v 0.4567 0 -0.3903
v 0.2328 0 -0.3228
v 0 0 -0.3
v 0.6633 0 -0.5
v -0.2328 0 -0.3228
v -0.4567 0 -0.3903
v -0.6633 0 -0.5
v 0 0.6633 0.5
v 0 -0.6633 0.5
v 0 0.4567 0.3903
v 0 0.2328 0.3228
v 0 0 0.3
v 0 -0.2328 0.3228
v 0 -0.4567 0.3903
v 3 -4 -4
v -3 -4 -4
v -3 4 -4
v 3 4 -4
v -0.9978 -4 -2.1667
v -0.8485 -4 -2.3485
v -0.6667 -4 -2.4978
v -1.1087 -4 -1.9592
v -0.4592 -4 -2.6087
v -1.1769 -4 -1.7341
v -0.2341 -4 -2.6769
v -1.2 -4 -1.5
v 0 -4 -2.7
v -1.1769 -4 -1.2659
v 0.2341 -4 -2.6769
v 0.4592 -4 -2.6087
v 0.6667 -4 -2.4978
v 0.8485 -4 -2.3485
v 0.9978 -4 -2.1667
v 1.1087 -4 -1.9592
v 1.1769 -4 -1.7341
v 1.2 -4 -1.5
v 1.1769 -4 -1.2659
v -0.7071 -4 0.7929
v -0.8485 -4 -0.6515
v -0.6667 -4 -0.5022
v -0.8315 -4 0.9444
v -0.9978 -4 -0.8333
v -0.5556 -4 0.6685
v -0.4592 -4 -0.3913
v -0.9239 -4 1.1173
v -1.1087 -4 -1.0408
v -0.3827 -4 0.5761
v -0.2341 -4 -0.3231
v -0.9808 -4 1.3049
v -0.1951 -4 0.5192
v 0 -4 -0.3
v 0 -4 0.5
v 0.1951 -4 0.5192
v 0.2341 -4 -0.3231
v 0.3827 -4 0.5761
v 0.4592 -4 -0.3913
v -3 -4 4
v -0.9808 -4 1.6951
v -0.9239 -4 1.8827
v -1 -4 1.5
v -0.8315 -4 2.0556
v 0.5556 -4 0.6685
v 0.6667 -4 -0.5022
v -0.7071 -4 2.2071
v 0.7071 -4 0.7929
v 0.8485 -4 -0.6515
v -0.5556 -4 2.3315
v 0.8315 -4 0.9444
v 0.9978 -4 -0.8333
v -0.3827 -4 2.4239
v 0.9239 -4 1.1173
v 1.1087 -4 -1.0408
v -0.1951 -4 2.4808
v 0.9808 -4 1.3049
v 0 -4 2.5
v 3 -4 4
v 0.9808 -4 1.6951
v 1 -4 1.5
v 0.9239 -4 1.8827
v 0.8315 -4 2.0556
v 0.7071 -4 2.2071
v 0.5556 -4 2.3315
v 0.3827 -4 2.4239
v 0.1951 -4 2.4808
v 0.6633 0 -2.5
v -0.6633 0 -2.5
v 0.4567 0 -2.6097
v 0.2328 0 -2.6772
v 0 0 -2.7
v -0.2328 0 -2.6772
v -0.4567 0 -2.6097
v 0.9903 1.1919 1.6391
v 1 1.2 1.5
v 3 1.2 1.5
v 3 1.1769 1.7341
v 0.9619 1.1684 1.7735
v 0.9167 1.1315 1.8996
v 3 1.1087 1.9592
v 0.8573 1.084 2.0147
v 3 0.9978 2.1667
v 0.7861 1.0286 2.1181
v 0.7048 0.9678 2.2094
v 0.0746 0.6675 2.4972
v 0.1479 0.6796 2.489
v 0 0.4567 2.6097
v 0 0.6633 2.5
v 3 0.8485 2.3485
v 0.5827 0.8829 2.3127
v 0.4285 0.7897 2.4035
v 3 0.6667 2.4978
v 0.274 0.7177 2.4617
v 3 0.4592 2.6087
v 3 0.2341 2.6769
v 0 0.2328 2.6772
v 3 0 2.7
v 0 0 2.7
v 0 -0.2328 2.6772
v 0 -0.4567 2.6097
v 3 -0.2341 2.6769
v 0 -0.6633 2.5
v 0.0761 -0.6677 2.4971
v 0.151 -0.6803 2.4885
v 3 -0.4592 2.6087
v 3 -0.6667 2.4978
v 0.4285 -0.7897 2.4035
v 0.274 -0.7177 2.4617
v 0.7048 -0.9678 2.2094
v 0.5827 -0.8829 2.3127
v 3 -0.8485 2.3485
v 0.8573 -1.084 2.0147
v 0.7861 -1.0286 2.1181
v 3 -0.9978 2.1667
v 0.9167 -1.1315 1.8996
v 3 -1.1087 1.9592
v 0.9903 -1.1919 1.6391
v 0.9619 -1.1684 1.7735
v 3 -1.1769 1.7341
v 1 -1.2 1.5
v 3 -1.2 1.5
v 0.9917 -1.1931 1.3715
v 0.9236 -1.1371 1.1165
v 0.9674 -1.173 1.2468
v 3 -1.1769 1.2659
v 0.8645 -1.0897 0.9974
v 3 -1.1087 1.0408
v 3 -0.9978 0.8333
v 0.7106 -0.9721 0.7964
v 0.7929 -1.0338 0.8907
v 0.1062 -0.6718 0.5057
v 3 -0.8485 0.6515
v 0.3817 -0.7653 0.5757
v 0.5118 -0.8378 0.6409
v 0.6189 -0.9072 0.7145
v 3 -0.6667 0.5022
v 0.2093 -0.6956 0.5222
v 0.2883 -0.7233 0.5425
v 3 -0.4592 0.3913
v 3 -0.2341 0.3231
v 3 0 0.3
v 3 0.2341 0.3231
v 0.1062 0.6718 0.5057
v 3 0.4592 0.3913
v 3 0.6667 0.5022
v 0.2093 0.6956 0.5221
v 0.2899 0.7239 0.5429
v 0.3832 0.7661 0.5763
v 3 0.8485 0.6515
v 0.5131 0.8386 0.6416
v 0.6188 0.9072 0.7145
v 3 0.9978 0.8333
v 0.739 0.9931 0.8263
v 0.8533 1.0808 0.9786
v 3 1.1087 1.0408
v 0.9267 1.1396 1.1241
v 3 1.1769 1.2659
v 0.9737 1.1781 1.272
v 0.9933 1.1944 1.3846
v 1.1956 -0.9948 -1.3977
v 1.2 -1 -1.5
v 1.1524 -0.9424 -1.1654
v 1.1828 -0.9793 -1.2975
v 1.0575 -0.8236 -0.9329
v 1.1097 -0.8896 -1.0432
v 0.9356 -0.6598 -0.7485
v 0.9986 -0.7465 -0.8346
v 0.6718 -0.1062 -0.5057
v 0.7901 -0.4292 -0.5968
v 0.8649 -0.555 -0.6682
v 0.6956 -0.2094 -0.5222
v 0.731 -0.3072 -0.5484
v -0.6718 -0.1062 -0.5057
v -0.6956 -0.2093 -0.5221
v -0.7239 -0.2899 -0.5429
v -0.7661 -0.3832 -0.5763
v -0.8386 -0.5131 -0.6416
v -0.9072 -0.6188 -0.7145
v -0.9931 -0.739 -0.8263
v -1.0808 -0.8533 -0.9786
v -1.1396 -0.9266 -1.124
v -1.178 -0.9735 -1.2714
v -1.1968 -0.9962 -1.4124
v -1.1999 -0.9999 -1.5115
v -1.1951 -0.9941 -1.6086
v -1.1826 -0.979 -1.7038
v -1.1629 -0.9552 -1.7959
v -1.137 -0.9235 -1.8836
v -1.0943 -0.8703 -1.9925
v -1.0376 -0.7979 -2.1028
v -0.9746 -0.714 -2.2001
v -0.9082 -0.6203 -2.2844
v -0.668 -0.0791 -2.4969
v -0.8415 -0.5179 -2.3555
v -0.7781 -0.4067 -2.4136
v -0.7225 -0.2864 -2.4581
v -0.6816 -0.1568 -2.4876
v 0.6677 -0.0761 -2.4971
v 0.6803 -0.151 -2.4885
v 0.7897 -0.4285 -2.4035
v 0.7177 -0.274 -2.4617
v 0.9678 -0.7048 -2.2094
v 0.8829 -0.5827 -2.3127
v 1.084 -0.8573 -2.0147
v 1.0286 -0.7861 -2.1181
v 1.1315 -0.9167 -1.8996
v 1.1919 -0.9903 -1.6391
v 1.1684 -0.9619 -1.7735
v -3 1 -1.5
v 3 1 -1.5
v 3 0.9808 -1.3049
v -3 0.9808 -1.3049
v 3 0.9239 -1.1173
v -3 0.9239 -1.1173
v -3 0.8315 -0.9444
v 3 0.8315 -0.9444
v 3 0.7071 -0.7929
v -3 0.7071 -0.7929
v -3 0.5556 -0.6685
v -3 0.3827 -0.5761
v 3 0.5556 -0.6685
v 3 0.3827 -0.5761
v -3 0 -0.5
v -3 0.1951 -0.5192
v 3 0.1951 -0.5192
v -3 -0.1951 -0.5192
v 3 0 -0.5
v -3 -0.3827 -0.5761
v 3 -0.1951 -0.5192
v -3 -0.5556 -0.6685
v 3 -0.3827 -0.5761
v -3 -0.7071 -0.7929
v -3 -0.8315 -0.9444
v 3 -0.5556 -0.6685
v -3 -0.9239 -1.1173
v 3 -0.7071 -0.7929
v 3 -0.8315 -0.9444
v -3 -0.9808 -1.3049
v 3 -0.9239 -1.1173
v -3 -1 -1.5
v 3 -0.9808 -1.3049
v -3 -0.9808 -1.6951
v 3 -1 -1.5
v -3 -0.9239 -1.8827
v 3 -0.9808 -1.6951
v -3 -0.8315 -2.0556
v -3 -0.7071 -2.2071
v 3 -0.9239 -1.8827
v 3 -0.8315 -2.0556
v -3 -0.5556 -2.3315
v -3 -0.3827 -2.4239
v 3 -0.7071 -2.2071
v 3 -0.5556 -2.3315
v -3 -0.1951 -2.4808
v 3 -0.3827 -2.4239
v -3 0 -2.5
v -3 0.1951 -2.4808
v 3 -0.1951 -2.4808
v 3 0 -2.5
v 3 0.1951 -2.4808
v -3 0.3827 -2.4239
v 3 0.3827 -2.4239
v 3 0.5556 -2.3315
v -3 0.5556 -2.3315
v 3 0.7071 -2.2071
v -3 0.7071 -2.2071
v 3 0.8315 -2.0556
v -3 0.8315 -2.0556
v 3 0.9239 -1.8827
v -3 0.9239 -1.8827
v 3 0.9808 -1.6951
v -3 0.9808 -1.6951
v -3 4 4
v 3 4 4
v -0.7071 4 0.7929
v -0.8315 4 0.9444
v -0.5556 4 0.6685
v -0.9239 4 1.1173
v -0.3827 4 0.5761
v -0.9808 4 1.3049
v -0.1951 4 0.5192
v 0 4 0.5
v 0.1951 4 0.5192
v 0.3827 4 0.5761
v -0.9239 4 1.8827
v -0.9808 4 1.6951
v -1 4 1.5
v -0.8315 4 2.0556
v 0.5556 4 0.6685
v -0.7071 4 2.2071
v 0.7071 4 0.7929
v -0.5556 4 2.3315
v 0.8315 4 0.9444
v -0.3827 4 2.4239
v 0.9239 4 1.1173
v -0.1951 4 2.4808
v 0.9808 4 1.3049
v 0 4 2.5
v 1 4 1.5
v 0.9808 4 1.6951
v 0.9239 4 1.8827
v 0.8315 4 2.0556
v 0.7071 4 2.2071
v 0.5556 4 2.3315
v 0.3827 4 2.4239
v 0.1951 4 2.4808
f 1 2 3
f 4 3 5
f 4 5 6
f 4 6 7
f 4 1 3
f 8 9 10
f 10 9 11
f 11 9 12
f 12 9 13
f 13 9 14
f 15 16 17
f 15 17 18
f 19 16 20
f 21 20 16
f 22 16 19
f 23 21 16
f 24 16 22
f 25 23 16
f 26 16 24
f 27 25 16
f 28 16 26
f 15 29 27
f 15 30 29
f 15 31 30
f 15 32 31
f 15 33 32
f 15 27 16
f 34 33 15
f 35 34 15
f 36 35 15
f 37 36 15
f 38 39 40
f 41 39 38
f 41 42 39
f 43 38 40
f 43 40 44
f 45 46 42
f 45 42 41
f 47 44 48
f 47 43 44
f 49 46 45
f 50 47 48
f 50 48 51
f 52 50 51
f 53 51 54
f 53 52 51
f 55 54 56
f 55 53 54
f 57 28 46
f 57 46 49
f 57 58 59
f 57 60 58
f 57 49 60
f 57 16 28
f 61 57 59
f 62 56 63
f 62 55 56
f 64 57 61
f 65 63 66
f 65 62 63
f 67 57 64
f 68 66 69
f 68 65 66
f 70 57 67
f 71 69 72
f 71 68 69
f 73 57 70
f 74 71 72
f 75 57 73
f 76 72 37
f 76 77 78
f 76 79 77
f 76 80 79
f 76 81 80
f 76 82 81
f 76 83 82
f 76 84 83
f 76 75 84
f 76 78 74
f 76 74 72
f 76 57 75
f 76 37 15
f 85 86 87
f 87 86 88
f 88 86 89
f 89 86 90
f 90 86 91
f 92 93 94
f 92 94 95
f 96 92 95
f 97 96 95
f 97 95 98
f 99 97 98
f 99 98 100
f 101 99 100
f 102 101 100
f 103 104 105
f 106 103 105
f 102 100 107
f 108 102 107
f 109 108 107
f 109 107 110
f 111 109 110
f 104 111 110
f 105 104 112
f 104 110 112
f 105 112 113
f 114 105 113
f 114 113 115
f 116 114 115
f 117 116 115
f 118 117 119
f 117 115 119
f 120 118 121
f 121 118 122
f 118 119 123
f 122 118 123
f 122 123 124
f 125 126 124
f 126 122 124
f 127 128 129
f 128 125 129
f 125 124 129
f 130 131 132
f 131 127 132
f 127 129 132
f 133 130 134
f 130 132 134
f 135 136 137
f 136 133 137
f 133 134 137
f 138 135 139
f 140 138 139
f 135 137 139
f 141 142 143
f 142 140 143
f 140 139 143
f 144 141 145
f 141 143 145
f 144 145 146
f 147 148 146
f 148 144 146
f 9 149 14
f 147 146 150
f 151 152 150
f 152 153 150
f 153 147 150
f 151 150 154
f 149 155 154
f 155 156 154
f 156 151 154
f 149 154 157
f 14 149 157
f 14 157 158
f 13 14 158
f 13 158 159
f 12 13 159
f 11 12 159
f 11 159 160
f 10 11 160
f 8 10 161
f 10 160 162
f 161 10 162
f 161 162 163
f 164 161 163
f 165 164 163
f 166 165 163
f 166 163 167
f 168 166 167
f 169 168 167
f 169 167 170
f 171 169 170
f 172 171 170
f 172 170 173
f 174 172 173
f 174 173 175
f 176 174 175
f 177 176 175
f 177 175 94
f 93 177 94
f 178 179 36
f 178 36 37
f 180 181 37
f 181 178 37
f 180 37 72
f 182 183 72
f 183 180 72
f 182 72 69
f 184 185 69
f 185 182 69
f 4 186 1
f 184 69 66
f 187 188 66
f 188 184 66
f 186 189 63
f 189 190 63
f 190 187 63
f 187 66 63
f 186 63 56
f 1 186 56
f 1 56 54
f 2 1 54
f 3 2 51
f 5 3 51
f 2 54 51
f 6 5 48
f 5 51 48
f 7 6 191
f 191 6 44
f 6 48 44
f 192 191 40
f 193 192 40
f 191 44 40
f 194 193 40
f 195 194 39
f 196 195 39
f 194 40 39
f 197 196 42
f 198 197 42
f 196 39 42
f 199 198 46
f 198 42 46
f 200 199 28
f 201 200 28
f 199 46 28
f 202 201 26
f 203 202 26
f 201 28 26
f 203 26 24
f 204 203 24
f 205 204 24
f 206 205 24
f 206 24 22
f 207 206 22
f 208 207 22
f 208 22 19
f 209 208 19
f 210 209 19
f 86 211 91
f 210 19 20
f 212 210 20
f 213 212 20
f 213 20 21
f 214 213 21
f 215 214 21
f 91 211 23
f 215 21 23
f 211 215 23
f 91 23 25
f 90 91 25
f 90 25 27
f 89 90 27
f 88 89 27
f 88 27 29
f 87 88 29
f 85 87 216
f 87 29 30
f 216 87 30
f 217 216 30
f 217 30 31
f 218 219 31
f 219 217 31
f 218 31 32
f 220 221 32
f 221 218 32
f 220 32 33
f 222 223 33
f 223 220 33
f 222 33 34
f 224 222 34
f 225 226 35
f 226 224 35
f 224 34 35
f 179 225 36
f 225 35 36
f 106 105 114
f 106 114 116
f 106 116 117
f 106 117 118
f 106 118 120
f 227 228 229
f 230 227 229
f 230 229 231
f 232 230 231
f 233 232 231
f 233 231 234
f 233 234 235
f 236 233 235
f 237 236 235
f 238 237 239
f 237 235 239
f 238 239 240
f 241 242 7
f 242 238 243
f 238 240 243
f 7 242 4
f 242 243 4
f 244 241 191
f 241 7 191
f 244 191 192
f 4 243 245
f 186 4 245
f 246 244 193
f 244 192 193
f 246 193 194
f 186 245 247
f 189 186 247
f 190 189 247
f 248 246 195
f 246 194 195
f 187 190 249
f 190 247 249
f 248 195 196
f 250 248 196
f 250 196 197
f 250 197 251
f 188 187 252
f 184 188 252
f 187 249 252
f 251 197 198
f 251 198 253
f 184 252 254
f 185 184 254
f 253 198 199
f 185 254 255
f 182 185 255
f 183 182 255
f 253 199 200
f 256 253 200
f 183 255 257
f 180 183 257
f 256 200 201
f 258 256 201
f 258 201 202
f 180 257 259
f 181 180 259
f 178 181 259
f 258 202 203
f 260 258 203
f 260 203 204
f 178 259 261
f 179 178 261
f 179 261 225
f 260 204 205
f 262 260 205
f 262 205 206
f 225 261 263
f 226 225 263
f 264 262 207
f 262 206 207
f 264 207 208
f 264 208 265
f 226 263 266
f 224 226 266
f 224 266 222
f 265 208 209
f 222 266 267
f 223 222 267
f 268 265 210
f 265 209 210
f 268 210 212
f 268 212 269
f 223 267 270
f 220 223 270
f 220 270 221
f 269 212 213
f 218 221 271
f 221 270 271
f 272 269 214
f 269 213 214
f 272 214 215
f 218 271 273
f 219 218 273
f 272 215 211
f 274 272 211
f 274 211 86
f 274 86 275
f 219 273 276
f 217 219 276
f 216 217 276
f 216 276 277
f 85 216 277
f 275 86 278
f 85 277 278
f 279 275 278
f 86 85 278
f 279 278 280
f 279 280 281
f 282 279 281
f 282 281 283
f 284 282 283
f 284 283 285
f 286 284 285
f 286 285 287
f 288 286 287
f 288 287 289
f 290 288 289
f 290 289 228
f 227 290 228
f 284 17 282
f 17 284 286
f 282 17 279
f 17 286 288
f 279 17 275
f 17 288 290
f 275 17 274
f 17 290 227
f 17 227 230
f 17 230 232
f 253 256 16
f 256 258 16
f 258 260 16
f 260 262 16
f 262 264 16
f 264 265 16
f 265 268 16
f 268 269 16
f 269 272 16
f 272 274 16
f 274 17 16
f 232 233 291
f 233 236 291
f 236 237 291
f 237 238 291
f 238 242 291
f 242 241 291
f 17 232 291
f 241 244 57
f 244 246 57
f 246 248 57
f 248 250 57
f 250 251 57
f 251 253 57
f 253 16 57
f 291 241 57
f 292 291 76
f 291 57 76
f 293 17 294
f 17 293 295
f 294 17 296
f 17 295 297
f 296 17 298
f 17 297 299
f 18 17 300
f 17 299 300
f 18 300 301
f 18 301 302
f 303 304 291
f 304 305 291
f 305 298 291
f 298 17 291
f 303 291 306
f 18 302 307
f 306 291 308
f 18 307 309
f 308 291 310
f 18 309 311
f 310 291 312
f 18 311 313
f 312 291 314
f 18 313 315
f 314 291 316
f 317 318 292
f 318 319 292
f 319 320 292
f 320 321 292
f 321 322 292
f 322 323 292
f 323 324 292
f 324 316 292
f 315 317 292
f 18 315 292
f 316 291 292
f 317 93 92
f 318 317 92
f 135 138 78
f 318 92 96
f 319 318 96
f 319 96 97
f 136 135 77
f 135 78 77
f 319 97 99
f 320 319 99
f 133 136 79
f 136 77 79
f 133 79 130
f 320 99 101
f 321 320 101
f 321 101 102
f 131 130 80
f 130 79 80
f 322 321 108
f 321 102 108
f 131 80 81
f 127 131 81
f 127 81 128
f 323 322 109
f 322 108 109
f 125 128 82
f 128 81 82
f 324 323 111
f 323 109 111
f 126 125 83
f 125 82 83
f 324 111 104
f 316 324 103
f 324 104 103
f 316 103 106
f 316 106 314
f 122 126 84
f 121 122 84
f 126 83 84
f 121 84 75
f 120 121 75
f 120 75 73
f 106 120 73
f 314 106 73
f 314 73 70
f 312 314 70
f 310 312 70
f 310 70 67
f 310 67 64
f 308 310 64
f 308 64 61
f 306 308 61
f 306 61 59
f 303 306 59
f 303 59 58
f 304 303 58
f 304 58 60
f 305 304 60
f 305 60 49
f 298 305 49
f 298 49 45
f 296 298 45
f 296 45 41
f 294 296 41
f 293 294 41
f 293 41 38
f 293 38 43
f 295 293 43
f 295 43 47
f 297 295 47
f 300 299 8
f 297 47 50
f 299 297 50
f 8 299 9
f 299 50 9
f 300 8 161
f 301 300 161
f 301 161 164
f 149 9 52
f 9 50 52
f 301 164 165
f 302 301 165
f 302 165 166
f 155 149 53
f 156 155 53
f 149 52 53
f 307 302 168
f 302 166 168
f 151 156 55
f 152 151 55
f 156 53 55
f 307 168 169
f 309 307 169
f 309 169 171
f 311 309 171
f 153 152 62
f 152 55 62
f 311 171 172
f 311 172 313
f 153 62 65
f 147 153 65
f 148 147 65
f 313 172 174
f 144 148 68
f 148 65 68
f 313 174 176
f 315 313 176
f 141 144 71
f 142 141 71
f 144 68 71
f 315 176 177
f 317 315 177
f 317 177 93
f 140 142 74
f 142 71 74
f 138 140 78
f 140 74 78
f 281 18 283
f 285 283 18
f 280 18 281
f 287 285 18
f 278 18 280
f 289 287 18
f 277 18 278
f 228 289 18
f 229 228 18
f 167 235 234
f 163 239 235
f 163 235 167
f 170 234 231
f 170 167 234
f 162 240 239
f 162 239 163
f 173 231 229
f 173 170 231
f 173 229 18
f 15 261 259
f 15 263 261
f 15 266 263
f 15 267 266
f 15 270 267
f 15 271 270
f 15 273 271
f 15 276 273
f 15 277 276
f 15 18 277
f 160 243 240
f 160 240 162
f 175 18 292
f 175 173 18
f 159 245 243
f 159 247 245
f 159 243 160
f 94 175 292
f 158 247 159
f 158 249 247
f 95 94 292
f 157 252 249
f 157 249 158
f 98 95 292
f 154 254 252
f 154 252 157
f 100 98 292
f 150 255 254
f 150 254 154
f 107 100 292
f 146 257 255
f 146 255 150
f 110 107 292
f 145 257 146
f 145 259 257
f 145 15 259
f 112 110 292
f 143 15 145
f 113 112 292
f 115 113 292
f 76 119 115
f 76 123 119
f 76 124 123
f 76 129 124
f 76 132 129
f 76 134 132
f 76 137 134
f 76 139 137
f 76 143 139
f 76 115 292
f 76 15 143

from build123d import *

# Parameters (mm, degrees)
F0_W          = 6
F0_H          = 8
F1_DEPTH      = 4
F1_DEPTH_BACK = 4
F2_R          = 1
F3_DEPTH      = 8.001
F4_R          = 1
F5_DEPTH      = 6.001
F6_R          = 1.2
F7_DEPTH      = 4
F8_R          = 1.2
F9_DEPTH      = 3


with BuildPart() as f1:
    # F0 (on Front) → F1 (new body, two sides)
    with BuildSketch(Plane.XZ) as f1_sk:
        Rectangle(F0_W, F0_H)
    extrude(amount=F1_DEPTH)
    extrude(f1_sk.sketch, amount=-F1_DEPTH_BACK)

    # F2 (on face) → F3 (cut, through all)
    with BuildSketch(Plane.XZ.offset(4)):
        with Locations((0, 1.5)):
            Circle(F2_R)
    extrude(amount=-F3_DEPTH, mode=Mode.SUBTRACT)

    # F4 (on face) → F5 (cut, through all)
    with BuildSketch(Plane.YZ.offset(3)):
        with Locations((0, -1.5)):
            Circle(F4_R)
    extrude(amount=-F5_DEPTH, mode=Mode.SUBTRACT)

    # F6 (on face) → F7 (cut)
    with BuildSketch(Plane.XZ.offset(4)):
        with Locations((0, -1.5)):
            Circle(F6_R)
    extrude(amount=-F7_DEPTH, mode=Mode.SUBTRACT)

    # F8 (on face) → F9 (cut)
    with BuildSketch(Plane.YZ.offset(3)):
        with Locations((0, 1.5)):
            Circle(F8_R)
    extrude(amount=-F9_DEPTH, mode=Mode.SUBTRACT)


solid = f1.part
